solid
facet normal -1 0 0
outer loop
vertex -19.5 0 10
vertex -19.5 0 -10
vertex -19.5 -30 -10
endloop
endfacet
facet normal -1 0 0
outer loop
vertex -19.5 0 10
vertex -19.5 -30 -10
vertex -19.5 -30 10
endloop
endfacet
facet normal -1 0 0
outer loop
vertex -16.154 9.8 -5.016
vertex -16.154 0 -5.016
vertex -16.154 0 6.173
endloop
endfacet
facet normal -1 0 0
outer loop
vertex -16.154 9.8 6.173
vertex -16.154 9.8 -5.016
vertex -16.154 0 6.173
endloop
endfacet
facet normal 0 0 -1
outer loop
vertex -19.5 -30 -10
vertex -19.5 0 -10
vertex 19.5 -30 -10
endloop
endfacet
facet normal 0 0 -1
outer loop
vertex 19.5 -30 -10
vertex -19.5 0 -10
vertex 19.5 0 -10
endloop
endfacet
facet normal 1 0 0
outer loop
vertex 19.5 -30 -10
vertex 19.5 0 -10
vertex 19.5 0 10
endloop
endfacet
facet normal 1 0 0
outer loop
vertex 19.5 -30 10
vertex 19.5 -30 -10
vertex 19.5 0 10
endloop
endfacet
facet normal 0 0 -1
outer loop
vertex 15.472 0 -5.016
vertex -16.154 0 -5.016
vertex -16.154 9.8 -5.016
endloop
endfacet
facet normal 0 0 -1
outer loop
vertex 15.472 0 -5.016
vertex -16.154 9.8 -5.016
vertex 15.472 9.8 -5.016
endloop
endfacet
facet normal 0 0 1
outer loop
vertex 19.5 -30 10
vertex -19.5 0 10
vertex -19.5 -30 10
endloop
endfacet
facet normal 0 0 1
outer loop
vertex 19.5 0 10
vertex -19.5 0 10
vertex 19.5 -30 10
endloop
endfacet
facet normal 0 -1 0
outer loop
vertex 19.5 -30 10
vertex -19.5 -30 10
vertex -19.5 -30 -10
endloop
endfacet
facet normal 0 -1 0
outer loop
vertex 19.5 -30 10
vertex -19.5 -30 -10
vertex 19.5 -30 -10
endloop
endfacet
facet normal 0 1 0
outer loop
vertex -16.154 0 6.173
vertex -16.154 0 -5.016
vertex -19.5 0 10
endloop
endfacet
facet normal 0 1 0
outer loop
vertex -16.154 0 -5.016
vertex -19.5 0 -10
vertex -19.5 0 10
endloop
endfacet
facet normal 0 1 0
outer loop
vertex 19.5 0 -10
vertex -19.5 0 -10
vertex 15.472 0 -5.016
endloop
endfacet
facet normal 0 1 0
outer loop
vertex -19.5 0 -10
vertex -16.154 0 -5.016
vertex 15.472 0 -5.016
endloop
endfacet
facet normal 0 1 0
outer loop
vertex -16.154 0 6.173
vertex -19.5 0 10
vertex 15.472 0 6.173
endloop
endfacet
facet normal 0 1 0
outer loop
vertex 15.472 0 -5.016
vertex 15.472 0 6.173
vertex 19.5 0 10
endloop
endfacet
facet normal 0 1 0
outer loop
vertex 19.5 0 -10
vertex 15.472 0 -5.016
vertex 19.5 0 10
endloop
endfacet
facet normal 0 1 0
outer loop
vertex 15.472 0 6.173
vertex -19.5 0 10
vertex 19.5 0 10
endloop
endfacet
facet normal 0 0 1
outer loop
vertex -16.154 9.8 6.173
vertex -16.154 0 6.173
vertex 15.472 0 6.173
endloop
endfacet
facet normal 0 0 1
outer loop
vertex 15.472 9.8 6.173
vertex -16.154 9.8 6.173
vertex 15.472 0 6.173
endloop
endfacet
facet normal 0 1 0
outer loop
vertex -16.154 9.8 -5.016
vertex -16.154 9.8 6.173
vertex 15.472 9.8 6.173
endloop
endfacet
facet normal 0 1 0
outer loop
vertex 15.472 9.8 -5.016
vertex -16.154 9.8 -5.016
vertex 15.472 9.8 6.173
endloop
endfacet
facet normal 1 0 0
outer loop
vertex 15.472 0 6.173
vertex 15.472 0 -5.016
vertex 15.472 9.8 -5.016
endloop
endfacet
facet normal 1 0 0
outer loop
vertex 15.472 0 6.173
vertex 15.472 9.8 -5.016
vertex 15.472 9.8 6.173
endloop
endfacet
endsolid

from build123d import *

# Parameters (mm, degrees)
F0_W     = 39
F0_H     = 20
F1_DEPTH = 30
F2_W     = 31.625382
F2_H     = 11.189356
F3_DEPTH = 39.8


with BuildPart() as f1:
    # F0 (on Front) → F1 (new body)
    with BuildSketch(Plane.XZ):
        Rectangle(F0_W, F0_H)
    extrude(amount=F1_DEPTH)

    # F2 (on face) → F3 (join)
    with BuildSketch(Plane.XZ.offset(30)):
        with Locations((-0.341064, 0.578394)):
            Rectangle(F2_W, F2_H)
    extrude(amount=-F3_DEPTH)


solid = f1.part
